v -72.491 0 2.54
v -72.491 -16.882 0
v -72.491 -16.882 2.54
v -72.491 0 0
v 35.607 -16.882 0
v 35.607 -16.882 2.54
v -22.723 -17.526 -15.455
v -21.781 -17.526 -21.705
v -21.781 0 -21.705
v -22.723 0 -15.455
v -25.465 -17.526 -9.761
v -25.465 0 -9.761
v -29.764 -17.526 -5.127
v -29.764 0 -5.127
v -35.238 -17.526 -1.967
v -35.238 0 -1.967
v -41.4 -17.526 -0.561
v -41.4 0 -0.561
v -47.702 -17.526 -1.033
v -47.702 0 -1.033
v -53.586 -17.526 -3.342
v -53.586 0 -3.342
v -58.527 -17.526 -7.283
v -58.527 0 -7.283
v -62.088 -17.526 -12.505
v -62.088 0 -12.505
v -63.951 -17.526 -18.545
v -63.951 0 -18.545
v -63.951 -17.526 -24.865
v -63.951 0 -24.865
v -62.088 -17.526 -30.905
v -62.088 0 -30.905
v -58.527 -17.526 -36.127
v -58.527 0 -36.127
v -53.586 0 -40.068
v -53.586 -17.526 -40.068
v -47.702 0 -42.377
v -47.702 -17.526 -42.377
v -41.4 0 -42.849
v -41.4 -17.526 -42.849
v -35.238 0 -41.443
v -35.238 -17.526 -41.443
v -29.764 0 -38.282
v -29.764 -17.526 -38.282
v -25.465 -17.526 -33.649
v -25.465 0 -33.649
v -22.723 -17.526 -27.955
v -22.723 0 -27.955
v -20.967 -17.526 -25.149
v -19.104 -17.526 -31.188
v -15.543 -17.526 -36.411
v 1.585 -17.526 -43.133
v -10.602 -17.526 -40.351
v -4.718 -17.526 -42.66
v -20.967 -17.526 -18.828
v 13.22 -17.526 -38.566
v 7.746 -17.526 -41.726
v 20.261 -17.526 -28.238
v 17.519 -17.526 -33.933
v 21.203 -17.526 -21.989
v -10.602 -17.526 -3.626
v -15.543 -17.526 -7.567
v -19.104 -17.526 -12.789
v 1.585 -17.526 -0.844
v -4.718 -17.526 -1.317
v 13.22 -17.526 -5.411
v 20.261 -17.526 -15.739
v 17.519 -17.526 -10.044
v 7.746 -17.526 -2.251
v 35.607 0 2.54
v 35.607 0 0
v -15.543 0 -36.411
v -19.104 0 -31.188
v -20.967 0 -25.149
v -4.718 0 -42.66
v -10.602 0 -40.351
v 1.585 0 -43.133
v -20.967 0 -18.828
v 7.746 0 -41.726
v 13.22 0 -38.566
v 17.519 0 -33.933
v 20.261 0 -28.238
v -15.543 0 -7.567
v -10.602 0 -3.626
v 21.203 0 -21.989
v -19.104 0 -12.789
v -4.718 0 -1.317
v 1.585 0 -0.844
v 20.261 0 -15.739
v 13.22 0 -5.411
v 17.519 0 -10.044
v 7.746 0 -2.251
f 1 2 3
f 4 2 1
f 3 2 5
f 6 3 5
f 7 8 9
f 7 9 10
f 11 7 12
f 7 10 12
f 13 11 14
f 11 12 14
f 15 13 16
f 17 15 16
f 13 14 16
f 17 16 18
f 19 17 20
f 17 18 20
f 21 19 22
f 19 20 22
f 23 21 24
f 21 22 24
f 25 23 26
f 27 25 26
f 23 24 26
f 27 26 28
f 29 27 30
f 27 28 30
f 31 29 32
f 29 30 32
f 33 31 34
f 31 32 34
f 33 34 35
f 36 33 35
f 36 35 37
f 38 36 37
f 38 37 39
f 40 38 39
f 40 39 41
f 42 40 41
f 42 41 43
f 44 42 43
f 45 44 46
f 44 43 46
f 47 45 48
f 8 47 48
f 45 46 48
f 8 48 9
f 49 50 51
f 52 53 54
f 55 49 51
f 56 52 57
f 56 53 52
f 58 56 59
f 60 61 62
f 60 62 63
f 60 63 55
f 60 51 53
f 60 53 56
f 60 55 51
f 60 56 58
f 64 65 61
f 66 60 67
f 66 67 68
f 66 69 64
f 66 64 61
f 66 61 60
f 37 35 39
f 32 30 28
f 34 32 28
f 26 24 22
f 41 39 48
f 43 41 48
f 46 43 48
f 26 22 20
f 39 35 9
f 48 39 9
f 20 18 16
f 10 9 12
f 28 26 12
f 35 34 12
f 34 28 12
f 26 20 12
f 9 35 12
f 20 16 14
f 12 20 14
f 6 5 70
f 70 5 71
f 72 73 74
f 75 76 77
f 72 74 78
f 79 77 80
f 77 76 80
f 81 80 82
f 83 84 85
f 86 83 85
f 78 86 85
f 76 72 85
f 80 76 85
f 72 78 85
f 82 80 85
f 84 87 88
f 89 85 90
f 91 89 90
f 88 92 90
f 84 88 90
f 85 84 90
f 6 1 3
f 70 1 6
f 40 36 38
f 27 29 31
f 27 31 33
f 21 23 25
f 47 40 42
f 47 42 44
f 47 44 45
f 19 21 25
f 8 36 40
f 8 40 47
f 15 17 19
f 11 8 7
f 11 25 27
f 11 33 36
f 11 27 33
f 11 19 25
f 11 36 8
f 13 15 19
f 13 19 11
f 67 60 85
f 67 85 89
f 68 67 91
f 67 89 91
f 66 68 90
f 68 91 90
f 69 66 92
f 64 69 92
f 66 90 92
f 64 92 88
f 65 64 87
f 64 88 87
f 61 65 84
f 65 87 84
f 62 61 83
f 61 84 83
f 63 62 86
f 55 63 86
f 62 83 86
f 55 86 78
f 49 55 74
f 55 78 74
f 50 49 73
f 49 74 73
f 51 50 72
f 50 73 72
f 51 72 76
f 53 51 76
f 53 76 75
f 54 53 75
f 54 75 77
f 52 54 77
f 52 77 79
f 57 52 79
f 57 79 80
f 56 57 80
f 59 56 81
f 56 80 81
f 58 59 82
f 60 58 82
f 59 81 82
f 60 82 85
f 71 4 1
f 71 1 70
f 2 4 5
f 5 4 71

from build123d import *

# Parameters (mm, degrees)
F0_W     = 108.098623
F0_H     = 16.881542
F1_DEPTH = 2.54
F2_R     = 21.203461
F3_DEPTH = 17.526


with BuildPart() as f1:
    # F0 (on Top) → F1 (new body)
    with BuildSketch(Plane.XY):
        with Locations((-18.442021, -8.440771)):
            Rectangle(F0_W, F0_H)
    extrude(amount=F1_DEPTH)


with BuildPart() as f3:
    # F2 (on Front) → F3 (new body)
    with BuildSketch(Plane.XZ):
        with Locations((-42.984094, -21.704841)):
            Circle(F2_R)
        with Locations((0, -21.988563)):
            Circle(F2_R)
    extrude(amount=F3_DEPTH)


solid = Compound([f1.part, f3.part])
